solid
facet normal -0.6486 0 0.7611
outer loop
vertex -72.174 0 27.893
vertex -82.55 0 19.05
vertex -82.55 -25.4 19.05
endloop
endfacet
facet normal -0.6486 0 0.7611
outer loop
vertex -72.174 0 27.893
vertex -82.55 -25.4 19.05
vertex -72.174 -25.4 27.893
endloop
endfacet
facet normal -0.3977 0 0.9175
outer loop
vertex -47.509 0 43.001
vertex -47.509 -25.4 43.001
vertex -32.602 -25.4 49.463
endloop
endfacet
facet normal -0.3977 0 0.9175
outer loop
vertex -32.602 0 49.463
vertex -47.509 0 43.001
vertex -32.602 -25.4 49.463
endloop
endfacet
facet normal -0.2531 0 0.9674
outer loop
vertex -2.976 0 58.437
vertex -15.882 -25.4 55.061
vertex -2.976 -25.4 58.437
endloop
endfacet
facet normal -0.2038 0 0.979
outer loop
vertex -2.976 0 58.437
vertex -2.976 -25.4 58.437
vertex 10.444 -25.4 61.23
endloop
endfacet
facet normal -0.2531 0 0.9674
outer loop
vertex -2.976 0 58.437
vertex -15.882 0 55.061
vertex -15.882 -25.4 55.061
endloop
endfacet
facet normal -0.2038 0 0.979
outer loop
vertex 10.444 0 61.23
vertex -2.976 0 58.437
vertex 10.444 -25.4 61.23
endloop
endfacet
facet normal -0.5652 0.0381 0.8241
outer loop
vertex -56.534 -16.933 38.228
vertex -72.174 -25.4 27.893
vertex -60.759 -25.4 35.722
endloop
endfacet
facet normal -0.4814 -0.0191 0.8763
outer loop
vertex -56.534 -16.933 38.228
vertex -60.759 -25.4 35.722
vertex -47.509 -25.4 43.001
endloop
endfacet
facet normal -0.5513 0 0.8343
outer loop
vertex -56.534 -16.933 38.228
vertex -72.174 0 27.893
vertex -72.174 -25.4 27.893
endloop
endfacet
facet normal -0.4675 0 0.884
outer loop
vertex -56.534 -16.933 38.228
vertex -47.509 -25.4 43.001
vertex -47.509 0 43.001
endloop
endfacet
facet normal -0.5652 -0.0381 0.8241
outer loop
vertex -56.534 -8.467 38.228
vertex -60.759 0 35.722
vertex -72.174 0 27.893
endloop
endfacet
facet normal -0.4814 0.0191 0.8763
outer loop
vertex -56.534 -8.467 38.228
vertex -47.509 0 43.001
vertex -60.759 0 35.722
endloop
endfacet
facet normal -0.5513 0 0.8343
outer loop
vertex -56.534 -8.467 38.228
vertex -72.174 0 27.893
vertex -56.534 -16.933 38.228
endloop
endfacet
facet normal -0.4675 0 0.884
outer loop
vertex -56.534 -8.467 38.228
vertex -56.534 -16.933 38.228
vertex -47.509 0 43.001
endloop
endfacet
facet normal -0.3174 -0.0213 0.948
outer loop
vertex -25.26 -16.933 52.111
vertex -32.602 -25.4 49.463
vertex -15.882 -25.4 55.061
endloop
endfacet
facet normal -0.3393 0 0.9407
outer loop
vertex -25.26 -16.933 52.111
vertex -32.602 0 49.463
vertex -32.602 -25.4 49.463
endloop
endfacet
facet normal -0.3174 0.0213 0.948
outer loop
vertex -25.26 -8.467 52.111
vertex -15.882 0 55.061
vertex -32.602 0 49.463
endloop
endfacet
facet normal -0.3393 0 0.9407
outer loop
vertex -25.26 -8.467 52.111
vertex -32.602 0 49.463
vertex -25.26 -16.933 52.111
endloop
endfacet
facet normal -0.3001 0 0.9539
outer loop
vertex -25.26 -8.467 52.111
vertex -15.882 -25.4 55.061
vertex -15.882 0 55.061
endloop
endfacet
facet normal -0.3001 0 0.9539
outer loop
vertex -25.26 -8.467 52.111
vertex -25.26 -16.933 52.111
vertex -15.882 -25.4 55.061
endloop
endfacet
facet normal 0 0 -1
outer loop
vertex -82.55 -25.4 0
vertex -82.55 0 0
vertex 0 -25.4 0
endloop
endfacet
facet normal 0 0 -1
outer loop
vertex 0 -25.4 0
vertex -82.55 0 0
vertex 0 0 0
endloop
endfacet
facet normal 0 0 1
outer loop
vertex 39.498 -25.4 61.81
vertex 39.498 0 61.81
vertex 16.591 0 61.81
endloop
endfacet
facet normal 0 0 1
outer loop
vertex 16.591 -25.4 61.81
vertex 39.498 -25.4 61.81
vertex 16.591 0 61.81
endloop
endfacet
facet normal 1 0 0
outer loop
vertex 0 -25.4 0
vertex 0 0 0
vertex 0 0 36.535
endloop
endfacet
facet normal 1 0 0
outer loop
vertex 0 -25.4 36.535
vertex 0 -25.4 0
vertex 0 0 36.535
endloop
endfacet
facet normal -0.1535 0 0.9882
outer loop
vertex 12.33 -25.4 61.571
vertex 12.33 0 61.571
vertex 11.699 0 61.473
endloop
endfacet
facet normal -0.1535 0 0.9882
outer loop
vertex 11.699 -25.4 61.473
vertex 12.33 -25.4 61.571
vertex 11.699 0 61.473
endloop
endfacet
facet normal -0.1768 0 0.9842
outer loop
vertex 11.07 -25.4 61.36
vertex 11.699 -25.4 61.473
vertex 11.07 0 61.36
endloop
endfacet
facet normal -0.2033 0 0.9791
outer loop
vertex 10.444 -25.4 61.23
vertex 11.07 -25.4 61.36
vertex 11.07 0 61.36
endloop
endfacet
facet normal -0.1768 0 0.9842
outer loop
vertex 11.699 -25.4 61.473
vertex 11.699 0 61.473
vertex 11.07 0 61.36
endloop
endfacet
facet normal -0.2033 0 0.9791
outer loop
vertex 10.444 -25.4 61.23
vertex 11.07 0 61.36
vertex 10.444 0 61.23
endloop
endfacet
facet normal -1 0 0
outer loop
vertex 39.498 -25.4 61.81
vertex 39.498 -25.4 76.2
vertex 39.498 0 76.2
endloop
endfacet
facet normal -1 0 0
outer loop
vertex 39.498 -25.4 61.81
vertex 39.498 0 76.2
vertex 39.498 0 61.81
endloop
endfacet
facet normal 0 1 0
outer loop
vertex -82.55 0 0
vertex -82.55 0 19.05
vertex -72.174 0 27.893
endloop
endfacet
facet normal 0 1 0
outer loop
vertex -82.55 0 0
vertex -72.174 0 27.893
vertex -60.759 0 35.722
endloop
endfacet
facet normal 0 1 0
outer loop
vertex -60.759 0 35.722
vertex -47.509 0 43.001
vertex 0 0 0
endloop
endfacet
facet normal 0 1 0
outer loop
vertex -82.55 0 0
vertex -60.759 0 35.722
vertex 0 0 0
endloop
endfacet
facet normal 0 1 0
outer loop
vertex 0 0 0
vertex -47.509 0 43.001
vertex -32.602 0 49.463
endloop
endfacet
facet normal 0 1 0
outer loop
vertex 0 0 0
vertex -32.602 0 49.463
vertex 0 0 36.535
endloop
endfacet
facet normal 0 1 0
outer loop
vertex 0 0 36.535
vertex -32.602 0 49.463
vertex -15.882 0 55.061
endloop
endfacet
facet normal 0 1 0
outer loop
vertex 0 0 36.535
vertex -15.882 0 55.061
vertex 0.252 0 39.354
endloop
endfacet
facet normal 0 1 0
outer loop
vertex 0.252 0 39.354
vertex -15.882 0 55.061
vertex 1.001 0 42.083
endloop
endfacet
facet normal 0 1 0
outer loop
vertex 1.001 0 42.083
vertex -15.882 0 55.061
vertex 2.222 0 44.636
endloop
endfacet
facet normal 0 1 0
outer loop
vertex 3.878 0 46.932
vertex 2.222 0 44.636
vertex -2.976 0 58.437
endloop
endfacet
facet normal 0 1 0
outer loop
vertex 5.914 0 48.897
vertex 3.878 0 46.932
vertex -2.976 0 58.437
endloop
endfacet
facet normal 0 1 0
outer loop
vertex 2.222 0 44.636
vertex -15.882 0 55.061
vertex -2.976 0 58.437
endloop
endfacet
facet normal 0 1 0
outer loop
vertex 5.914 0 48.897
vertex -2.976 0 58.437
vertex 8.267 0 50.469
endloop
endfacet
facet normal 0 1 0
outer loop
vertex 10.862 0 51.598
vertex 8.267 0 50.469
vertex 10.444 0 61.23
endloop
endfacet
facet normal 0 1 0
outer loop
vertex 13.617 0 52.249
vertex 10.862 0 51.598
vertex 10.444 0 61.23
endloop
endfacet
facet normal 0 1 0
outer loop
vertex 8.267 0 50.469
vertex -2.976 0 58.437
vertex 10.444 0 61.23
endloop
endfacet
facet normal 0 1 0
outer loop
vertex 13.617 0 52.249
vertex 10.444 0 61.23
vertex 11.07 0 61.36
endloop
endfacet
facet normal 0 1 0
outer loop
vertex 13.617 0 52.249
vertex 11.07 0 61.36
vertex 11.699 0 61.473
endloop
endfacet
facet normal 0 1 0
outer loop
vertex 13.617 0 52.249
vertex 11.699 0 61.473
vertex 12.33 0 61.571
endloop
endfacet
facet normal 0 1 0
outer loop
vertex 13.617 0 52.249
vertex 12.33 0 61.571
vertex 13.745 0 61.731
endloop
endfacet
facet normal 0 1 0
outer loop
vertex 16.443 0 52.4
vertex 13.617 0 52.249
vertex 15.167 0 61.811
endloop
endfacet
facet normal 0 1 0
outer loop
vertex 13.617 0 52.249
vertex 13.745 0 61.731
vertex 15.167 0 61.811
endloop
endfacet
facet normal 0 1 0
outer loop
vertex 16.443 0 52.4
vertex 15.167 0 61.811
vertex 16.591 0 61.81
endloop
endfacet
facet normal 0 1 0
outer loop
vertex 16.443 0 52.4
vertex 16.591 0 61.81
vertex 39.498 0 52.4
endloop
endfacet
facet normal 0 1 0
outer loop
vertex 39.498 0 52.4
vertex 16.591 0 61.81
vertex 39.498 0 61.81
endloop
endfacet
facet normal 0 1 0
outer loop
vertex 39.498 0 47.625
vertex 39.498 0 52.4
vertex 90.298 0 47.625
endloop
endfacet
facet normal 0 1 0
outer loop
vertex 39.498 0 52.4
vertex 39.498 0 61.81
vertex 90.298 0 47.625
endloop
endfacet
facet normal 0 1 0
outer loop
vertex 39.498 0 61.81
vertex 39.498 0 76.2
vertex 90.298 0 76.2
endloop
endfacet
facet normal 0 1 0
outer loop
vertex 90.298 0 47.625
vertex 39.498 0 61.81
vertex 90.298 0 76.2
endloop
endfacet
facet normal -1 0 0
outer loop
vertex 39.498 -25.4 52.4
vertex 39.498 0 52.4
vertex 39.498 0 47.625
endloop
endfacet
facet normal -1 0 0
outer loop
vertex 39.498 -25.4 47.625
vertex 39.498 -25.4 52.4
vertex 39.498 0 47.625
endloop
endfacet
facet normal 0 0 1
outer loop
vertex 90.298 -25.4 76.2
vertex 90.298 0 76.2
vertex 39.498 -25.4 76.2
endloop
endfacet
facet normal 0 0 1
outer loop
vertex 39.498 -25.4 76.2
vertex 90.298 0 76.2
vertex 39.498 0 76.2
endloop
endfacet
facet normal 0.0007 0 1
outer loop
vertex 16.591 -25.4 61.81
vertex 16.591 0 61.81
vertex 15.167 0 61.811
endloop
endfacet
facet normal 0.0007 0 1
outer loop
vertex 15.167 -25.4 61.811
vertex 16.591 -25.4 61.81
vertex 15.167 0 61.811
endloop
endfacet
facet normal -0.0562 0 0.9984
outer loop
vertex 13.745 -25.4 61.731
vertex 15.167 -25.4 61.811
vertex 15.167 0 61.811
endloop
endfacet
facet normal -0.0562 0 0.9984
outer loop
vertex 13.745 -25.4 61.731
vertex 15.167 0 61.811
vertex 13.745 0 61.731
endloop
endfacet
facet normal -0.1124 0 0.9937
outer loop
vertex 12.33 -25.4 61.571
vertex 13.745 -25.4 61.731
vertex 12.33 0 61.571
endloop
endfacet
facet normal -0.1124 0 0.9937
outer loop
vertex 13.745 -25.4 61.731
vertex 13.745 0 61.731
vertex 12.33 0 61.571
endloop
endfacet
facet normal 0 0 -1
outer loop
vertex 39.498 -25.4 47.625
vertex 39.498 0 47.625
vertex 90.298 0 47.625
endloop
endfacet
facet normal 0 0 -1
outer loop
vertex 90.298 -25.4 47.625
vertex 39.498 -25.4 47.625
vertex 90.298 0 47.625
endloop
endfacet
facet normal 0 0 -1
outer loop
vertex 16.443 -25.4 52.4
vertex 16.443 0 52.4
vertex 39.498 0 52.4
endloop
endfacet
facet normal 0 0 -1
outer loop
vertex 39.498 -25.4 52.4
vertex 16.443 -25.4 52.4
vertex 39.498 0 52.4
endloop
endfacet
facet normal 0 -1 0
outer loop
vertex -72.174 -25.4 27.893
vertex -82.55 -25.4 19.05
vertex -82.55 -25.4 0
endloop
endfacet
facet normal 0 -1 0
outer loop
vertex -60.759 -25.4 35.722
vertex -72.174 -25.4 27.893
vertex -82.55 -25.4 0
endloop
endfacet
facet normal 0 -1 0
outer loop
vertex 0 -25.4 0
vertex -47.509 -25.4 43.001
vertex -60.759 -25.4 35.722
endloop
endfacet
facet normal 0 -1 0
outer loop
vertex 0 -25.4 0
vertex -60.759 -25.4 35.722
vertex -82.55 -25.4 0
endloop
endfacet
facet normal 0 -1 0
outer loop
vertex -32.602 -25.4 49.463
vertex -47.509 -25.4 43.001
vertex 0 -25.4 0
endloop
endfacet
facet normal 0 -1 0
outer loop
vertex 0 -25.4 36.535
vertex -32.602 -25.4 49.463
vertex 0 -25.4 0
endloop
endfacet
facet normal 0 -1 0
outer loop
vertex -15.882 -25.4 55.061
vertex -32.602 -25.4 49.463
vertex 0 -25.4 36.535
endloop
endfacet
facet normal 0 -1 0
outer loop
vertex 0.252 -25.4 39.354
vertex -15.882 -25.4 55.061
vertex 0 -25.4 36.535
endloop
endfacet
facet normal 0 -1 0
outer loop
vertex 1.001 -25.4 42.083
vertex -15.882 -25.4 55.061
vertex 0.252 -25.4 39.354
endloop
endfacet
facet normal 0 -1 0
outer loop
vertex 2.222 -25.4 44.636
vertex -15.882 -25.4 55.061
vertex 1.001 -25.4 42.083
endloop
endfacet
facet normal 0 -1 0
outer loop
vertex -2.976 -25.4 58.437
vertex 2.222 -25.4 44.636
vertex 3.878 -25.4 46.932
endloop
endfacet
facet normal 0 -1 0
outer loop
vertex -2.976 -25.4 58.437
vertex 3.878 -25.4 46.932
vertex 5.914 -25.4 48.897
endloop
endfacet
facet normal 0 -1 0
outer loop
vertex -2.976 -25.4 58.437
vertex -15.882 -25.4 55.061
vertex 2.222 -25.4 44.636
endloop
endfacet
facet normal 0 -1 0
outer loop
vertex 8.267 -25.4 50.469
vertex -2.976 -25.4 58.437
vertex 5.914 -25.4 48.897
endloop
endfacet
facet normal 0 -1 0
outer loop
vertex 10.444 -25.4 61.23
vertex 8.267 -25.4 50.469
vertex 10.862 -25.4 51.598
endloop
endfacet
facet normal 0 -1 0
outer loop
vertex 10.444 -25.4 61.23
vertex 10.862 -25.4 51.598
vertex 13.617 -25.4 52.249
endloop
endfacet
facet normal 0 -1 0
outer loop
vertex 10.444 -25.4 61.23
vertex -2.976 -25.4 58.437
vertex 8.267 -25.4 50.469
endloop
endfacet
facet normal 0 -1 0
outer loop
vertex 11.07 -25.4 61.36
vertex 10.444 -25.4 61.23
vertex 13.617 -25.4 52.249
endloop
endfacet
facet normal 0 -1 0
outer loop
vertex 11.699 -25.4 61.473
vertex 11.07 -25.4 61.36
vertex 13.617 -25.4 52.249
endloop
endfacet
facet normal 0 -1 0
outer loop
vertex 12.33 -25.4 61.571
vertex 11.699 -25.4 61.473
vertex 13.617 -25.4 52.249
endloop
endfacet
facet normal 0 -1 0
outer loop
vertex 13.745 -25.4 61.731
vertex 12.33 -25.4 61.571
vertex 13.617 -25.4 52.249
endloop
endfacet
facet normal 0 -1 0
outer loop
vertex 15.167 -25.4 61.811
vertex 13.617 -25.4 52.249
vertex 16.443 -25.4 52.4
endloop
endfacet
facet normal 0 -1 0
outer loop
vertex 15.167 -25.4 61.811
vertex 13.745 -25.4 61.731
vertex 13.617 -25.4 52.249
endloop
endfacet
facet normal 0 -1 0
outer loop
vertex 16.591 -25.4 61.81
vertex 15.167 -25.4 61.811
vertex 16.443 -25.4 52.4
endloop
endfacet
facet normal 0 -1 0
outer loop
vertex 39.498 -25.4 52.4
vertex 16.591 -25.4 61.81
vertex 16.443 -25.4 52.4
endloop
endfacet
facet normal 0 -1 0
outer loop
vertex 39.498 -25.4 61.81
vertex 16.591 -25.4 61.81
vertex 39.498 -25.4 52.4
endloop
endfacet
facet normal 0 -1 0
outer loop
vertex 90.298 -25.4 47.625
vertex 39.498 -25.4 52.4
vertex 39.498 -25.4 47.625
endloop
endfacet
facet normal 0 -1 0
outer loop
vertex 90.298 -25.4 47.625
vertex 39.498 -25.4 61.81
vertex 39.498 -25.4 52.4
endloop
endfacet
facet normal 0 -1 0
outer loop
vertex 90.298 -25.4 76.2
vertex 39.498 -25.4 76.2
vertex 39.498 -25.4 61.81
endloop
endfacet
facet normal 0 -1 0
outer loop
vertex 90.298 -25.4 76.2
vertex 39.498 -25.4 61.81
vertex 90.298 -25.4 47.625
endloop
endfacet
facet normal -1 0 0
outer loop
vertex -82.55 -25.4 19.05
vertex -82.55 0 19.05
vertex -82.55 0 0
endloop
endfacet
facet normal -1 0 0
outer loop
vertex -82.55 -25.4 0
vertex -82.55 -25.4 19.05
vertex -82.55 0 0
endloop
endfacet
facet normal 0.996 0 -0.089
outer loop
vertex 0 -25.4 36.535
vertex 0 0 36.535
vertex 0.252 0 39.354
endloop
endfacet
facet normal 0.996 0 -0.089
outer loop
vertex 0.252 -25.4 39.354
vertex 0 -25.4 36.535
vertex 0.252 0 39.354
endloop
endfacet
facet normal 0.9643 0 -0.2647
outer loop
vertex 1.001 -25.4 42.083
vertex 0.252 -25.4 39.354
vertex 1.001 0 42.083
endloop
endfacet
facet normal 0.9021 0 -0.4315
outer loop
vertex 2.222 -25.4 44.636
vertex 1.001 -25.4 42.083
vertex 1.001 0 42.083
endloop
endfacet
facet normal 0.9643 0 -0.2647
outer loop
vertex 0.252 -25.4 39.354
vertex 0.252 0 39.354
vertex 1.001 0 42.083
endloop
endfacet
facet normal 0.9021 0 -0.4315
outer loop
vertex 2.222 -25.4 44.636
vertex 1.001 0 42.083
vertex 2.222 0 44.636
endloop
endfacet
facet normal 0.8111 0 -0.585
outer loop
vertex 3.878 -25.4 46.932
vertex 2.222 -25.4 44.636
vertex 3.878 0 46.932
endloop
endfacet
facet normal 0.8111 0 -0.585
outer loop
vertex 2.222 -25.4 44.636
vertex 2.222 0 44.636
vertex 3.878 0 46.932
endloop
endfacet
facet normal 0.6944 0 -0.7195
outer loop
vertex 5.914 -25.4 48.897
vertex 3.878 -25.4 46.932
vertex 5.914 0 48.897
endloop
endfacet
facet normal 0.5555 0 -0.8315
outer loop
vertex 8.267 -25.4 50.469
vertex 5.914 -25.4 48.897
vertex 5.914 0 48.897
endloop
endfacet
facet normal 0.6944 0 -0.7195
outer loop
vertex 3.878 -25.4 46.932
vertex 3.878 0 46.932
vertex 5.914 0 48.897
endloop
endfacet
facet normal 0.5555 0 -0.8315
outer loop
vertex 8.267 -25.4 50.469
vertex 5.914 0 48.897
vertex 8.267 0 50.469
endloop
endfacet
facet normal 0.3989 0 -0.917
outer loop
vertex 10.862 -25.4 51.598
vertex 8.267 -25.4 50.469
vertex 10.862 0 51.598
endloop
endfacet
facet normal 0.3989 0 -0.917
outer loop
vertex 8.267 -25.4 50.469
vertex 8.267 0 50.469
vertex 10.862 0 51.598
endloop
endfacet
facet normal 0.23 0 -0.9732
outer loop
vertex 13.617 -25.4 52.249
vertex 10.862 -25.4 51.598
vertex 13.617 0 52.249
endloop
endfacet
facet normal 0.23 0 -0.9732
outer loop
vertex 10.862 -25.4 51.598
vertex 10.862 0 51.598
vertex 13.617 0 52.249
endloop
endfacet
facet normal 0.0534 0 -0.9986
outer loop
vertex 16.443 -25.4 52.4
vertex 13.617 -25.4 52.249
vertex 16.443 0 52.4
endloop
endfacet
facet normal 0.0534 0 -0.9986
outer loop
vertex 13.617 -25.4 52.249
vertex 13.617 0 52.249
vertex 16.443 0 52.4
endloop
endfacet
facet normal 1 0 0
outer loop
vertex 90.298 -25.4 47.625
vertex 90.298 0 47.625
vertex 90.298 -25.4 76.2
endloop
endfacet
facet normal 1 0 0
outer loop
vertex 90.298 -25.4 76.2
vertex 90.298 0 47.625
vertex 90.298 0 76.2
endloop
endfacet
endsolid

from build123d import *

# Parameters (mm, degrees)
F1_DEPTH = 25.4


with BuildPart() as f1:
    # F0 (on Front) → F1 (new body)
    with BuildSketch(Plane.XZ):
        Polygon((-82.55, 0), (0, 0), (0, 19.05), (-9.4102, 19.05), (-82.55, 19.05), align=None)
        with BuildLine():
            Line((-9.4102, 19.05), (0, 19.05))
            Line((0, 19.05), (0, 36.535349))
            ThreePointArc((0, 36.535349), (4.852166, 47.959566), (16.442551, 52.4002))
            Line((16.442551, 52.4002), (39.498304, 52.4002))
            Line((39.498304, 52.4002), (39.498304, 61.8104))
            Line((39.498304, 61.8104), (16.591319, 61.8104))
            ThreePointArc((16.591319, 61.8104), (14.455766, 61.780687), (12.330339, 61.570857))
            add(Edge.make_bspline(
                [(10.443617, 61.230316), (11.07103, 61.345589), (11.699943, 61.459099), (12.330339, 61.570857)],
                knots=[102.267957, 102.267957, 102.267957, 102.267957, 103.972602, 103.972602, 103.972602, 103.972602], degree=3))
            ThreePointArc((10.443617, 61.230316), (-3.83128, 52.37845), (-9.4102, 36.535349))
            Line((-9.4102, 36.535349), (-9.4102, 19.05))
        make_face()
        with BuildLine():
            add(Edge.make_bspline(
                [(-82.55, 19.05), (-59.439801, 41.052572), (-27.197229, 54.314634), (10.443617, 61.230316)],
                knots=[0, 0, 0, 0, 102.267957, 102.267957, 102.267957, 102.267957], degree=3))
            Line((-82.55, 19.05), (-9.4102, 19.05))
            Line((-9.4102, 19.05), (-9.4102, 36.535349))
            ThreePointArc((-9.4102, 36.535349), (-3.83128, 52.37845), (10.443617, 61.230316))
        make_face()
        with BuildLine():
            ThreePointArc((12.330339, 61.570857), (11.383749, 61.418475), (10.443617, 61.230316))
            add(Edge.make_bspline(
                [(10.443617, 61.230316), (11.07103, 61.345589), (11.699943, 61.459099), (12.330339, 61.570857)],
                knots=[102.267957, 102.267957, 102.267957, 102.267957, 103.972602, 103.972602, 103.972602, 103.972602], degree=3))
        make_face()
        Polygon((39.498304, 61.8104), (39.498304, 52.4002), (39.498304, 47.625), (90.298304, 47.625), (90.298304, 76.2), (39.498304, 76.2), align=None)
    extrude(amount=F1_DEPTH)


solid = f1.part
